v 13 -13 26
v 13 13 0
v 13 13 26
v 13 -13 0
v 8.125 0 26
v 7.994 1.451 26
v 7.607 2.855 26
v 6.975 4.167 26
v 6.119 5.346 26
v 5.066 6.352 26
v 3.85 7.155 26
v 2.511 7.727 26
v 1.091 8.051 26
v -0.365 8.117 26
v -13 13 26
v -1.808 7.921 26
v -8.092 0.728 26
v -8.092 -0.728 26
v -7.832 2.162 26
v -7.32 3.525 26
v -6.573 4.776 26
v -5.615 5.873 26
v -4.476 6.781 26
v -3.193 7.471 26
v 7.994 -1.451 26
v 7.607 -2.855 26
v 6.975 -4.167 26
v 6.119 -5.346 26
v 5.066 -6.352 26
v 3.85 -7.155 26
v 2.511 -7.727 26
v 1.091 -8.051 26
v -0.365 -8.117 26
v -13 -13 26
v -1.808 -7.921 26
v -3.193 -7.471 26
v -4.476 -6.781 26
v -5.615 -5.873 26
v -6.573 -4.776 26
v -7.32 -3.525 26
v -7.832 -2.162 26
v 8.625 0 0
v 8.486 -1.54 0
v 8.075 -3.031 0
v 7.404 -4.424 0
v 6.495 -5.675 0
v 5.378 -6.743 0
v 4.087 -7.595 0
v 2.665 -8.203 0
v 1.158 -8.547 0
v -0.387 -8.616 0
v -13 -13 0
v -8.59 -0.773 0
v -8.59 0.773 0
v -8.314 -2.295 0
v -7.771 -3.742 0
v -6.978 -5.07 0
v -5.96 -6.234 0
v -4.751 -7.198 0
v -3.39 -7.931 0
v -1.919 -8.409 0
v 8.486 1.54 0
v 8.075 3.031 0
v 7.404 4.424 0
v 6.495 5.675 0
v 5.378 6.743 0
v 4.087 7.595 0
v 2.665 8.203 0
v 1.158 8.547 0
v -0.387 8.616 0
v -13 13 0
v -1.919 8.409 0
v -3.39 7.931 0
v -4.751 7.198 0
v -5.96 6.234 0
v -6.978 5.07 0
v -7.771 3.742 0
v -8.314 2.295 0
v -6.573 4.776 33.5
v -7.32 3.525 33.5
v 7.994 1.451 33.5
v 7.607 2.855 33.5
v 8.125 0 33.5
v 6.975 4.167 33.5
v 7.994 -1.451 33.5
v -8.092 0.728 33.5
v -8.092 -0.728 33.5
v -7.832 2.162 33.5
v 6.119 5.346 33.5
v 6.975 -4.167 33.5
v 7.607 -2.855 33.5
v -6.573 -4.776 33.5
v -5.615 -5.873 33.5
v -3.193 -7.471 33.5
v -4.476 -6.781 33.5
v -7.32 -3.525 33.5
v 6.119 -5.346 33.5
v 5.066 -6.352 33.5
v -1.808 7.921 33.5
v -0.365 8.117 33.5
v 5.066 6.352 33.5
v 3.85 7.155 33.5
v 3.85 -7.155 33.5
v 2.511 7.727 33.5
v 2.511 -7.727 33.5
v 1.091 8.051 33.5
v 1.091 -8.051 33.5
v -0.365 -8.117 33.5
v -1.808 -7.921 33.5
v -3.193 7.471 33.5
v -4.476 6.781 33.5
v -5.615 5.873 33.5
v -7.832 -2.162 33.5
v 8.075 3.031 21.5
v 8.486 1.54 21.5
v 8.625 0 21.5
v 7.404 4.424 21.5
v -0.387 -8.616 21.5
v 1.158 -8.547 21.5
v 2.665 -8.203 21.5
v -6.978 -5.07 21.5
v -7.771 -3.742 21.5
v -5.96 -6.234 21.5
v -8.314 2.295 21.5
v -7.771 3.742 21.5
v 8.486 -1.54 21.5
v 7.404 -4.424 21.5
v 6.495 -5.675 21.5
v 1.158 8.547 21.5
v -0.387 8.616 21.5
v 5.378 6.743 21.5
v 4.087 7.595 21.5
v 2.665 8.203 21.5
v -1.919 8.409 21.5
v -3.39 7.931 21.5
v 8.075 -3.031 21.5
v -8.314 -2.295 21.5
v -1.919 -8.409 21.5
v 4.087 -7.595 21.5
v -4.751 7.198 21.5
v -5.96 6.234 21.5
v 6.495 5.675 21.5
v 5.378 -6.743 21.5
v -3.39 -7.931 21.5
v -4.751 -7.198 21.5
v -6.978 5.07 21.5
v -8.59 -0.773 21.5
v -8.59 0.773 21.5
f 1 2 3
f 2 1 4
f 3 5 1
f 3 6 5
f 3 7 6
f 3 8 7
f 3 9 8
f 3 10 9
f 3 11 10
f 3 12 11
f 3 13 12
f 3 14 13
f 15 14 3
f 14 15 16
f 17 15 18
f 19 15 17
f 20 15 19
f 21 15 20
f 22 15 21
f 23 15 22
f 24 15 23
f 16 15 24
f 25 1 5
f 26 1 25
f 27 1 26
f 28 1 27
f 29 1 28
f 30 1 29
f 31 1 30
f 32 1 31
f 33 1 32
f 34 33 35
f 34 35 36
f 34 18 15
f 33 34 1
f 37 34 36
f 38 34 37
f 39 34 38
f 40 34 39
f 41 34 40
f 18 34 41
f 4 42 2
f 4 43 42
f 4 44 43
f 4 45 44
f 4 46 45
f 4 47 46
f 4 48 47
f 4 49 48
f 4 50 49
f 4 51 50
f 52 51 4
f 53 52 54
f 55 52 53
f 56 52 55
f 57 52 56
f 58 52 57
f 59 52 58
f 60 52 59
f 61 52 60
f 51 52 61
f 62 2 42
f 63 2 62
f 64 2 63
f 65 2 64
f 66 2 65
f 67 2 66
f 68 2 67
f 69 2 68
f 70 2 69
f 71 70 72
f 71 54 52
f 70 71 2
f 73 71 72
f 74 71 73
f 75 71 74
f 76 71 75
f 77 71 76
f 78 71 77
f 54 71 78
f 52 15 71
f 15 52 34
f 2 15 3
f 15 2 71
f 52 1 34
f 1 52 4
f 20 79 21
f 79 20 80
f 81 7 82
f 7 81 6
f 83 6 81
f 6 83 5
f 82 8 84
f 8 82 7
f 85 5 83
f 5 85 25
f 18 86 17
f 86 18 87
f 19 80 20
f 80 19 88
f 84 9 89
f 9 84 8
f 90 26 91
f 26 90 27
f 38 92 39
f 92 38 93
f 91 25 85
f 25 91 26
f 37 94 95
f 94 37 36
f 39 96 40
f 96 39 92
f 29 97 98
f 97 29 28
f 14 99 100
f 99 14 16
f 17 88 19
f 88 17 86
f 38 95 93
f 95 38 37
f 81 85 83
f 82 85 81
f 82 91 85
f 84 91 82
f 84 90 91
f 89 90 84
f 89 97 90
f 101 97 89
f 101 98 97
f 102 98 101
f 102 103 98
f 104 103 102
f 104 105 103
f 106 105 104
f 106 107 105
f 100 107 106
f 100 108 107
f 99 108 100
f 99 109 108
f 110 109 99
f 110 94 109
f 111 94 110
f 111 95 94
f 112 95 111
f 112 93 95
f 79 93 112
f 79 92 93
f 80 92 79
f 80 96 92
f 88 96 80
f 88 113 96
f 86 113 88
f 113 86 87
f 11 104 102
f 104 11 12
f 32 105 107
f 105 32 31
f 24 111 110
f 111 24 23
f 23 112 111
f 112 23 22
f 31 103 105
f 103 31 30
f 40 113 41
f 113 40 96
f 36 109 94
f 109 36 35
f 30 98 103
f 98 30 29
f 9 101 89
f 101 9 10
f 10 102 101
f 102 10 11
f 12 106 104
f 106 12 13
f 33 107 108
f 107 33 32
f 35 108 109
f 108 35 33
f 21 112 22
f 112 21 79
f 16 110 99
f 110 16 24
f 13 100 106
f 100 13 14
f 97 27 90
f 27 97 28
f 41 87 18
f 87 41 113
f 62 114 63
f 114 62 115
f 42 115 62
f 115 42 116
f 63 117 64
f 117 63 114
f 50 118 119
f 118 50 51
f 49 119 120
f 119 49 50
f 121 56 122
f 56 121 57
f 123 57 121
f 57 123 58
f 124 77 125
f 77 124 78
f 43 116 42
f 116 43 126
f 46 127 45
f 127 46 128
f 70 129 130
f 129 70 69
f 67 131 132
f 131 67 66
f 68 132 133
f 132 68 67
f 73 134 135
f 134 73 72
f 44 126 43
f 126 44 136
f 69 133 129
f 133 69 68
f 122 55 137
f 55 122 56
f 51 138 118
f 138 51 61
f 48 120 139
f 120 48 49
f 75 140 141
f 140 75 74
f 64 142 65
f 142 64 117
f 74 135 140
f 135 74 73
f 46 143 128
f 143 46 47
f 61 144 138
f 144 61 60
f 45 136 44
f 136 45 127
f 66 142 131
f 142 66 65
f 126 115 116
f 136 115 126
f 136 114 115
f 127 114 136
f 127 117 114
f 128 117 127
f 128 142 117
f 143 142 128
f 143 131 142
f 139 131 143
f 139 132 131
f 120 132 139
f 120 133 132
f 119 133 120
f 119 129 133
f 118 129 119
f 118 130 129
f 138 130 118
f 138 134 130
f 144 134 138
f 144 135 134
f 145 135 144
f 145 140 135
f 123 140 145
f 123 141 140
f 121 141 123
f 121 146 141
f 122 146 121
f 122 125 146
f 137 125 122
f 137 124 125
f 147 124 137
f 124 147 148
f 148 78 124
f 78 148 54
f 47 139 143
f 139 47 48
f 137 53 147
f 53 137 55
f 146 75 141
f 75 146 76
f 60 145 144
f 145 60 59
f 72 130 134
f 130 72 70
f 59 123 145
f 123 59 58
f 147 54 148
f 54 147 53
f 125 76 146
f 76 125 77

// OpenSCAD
smooth = 35;

cube_side = 26;
cylinder_height = cube_side * 0.75;
cylinder_diameter = cube_side * 0.625;

module brick() {
    translate([0,0,cube_side/2]) cube([cube_side,cube_side,cube_side], center=true);
    translate([0,0,(cube_side/2) + 1]) cylinder(h = cylinder_height, d = cylinder_diameter, $fn=smooth);
}

difference() {
    brick();
    translate([0,0,-1]) cylinder(h = cylinder_height + 3, d = cylinder_diameter + 1, $fn=smooth);
}
